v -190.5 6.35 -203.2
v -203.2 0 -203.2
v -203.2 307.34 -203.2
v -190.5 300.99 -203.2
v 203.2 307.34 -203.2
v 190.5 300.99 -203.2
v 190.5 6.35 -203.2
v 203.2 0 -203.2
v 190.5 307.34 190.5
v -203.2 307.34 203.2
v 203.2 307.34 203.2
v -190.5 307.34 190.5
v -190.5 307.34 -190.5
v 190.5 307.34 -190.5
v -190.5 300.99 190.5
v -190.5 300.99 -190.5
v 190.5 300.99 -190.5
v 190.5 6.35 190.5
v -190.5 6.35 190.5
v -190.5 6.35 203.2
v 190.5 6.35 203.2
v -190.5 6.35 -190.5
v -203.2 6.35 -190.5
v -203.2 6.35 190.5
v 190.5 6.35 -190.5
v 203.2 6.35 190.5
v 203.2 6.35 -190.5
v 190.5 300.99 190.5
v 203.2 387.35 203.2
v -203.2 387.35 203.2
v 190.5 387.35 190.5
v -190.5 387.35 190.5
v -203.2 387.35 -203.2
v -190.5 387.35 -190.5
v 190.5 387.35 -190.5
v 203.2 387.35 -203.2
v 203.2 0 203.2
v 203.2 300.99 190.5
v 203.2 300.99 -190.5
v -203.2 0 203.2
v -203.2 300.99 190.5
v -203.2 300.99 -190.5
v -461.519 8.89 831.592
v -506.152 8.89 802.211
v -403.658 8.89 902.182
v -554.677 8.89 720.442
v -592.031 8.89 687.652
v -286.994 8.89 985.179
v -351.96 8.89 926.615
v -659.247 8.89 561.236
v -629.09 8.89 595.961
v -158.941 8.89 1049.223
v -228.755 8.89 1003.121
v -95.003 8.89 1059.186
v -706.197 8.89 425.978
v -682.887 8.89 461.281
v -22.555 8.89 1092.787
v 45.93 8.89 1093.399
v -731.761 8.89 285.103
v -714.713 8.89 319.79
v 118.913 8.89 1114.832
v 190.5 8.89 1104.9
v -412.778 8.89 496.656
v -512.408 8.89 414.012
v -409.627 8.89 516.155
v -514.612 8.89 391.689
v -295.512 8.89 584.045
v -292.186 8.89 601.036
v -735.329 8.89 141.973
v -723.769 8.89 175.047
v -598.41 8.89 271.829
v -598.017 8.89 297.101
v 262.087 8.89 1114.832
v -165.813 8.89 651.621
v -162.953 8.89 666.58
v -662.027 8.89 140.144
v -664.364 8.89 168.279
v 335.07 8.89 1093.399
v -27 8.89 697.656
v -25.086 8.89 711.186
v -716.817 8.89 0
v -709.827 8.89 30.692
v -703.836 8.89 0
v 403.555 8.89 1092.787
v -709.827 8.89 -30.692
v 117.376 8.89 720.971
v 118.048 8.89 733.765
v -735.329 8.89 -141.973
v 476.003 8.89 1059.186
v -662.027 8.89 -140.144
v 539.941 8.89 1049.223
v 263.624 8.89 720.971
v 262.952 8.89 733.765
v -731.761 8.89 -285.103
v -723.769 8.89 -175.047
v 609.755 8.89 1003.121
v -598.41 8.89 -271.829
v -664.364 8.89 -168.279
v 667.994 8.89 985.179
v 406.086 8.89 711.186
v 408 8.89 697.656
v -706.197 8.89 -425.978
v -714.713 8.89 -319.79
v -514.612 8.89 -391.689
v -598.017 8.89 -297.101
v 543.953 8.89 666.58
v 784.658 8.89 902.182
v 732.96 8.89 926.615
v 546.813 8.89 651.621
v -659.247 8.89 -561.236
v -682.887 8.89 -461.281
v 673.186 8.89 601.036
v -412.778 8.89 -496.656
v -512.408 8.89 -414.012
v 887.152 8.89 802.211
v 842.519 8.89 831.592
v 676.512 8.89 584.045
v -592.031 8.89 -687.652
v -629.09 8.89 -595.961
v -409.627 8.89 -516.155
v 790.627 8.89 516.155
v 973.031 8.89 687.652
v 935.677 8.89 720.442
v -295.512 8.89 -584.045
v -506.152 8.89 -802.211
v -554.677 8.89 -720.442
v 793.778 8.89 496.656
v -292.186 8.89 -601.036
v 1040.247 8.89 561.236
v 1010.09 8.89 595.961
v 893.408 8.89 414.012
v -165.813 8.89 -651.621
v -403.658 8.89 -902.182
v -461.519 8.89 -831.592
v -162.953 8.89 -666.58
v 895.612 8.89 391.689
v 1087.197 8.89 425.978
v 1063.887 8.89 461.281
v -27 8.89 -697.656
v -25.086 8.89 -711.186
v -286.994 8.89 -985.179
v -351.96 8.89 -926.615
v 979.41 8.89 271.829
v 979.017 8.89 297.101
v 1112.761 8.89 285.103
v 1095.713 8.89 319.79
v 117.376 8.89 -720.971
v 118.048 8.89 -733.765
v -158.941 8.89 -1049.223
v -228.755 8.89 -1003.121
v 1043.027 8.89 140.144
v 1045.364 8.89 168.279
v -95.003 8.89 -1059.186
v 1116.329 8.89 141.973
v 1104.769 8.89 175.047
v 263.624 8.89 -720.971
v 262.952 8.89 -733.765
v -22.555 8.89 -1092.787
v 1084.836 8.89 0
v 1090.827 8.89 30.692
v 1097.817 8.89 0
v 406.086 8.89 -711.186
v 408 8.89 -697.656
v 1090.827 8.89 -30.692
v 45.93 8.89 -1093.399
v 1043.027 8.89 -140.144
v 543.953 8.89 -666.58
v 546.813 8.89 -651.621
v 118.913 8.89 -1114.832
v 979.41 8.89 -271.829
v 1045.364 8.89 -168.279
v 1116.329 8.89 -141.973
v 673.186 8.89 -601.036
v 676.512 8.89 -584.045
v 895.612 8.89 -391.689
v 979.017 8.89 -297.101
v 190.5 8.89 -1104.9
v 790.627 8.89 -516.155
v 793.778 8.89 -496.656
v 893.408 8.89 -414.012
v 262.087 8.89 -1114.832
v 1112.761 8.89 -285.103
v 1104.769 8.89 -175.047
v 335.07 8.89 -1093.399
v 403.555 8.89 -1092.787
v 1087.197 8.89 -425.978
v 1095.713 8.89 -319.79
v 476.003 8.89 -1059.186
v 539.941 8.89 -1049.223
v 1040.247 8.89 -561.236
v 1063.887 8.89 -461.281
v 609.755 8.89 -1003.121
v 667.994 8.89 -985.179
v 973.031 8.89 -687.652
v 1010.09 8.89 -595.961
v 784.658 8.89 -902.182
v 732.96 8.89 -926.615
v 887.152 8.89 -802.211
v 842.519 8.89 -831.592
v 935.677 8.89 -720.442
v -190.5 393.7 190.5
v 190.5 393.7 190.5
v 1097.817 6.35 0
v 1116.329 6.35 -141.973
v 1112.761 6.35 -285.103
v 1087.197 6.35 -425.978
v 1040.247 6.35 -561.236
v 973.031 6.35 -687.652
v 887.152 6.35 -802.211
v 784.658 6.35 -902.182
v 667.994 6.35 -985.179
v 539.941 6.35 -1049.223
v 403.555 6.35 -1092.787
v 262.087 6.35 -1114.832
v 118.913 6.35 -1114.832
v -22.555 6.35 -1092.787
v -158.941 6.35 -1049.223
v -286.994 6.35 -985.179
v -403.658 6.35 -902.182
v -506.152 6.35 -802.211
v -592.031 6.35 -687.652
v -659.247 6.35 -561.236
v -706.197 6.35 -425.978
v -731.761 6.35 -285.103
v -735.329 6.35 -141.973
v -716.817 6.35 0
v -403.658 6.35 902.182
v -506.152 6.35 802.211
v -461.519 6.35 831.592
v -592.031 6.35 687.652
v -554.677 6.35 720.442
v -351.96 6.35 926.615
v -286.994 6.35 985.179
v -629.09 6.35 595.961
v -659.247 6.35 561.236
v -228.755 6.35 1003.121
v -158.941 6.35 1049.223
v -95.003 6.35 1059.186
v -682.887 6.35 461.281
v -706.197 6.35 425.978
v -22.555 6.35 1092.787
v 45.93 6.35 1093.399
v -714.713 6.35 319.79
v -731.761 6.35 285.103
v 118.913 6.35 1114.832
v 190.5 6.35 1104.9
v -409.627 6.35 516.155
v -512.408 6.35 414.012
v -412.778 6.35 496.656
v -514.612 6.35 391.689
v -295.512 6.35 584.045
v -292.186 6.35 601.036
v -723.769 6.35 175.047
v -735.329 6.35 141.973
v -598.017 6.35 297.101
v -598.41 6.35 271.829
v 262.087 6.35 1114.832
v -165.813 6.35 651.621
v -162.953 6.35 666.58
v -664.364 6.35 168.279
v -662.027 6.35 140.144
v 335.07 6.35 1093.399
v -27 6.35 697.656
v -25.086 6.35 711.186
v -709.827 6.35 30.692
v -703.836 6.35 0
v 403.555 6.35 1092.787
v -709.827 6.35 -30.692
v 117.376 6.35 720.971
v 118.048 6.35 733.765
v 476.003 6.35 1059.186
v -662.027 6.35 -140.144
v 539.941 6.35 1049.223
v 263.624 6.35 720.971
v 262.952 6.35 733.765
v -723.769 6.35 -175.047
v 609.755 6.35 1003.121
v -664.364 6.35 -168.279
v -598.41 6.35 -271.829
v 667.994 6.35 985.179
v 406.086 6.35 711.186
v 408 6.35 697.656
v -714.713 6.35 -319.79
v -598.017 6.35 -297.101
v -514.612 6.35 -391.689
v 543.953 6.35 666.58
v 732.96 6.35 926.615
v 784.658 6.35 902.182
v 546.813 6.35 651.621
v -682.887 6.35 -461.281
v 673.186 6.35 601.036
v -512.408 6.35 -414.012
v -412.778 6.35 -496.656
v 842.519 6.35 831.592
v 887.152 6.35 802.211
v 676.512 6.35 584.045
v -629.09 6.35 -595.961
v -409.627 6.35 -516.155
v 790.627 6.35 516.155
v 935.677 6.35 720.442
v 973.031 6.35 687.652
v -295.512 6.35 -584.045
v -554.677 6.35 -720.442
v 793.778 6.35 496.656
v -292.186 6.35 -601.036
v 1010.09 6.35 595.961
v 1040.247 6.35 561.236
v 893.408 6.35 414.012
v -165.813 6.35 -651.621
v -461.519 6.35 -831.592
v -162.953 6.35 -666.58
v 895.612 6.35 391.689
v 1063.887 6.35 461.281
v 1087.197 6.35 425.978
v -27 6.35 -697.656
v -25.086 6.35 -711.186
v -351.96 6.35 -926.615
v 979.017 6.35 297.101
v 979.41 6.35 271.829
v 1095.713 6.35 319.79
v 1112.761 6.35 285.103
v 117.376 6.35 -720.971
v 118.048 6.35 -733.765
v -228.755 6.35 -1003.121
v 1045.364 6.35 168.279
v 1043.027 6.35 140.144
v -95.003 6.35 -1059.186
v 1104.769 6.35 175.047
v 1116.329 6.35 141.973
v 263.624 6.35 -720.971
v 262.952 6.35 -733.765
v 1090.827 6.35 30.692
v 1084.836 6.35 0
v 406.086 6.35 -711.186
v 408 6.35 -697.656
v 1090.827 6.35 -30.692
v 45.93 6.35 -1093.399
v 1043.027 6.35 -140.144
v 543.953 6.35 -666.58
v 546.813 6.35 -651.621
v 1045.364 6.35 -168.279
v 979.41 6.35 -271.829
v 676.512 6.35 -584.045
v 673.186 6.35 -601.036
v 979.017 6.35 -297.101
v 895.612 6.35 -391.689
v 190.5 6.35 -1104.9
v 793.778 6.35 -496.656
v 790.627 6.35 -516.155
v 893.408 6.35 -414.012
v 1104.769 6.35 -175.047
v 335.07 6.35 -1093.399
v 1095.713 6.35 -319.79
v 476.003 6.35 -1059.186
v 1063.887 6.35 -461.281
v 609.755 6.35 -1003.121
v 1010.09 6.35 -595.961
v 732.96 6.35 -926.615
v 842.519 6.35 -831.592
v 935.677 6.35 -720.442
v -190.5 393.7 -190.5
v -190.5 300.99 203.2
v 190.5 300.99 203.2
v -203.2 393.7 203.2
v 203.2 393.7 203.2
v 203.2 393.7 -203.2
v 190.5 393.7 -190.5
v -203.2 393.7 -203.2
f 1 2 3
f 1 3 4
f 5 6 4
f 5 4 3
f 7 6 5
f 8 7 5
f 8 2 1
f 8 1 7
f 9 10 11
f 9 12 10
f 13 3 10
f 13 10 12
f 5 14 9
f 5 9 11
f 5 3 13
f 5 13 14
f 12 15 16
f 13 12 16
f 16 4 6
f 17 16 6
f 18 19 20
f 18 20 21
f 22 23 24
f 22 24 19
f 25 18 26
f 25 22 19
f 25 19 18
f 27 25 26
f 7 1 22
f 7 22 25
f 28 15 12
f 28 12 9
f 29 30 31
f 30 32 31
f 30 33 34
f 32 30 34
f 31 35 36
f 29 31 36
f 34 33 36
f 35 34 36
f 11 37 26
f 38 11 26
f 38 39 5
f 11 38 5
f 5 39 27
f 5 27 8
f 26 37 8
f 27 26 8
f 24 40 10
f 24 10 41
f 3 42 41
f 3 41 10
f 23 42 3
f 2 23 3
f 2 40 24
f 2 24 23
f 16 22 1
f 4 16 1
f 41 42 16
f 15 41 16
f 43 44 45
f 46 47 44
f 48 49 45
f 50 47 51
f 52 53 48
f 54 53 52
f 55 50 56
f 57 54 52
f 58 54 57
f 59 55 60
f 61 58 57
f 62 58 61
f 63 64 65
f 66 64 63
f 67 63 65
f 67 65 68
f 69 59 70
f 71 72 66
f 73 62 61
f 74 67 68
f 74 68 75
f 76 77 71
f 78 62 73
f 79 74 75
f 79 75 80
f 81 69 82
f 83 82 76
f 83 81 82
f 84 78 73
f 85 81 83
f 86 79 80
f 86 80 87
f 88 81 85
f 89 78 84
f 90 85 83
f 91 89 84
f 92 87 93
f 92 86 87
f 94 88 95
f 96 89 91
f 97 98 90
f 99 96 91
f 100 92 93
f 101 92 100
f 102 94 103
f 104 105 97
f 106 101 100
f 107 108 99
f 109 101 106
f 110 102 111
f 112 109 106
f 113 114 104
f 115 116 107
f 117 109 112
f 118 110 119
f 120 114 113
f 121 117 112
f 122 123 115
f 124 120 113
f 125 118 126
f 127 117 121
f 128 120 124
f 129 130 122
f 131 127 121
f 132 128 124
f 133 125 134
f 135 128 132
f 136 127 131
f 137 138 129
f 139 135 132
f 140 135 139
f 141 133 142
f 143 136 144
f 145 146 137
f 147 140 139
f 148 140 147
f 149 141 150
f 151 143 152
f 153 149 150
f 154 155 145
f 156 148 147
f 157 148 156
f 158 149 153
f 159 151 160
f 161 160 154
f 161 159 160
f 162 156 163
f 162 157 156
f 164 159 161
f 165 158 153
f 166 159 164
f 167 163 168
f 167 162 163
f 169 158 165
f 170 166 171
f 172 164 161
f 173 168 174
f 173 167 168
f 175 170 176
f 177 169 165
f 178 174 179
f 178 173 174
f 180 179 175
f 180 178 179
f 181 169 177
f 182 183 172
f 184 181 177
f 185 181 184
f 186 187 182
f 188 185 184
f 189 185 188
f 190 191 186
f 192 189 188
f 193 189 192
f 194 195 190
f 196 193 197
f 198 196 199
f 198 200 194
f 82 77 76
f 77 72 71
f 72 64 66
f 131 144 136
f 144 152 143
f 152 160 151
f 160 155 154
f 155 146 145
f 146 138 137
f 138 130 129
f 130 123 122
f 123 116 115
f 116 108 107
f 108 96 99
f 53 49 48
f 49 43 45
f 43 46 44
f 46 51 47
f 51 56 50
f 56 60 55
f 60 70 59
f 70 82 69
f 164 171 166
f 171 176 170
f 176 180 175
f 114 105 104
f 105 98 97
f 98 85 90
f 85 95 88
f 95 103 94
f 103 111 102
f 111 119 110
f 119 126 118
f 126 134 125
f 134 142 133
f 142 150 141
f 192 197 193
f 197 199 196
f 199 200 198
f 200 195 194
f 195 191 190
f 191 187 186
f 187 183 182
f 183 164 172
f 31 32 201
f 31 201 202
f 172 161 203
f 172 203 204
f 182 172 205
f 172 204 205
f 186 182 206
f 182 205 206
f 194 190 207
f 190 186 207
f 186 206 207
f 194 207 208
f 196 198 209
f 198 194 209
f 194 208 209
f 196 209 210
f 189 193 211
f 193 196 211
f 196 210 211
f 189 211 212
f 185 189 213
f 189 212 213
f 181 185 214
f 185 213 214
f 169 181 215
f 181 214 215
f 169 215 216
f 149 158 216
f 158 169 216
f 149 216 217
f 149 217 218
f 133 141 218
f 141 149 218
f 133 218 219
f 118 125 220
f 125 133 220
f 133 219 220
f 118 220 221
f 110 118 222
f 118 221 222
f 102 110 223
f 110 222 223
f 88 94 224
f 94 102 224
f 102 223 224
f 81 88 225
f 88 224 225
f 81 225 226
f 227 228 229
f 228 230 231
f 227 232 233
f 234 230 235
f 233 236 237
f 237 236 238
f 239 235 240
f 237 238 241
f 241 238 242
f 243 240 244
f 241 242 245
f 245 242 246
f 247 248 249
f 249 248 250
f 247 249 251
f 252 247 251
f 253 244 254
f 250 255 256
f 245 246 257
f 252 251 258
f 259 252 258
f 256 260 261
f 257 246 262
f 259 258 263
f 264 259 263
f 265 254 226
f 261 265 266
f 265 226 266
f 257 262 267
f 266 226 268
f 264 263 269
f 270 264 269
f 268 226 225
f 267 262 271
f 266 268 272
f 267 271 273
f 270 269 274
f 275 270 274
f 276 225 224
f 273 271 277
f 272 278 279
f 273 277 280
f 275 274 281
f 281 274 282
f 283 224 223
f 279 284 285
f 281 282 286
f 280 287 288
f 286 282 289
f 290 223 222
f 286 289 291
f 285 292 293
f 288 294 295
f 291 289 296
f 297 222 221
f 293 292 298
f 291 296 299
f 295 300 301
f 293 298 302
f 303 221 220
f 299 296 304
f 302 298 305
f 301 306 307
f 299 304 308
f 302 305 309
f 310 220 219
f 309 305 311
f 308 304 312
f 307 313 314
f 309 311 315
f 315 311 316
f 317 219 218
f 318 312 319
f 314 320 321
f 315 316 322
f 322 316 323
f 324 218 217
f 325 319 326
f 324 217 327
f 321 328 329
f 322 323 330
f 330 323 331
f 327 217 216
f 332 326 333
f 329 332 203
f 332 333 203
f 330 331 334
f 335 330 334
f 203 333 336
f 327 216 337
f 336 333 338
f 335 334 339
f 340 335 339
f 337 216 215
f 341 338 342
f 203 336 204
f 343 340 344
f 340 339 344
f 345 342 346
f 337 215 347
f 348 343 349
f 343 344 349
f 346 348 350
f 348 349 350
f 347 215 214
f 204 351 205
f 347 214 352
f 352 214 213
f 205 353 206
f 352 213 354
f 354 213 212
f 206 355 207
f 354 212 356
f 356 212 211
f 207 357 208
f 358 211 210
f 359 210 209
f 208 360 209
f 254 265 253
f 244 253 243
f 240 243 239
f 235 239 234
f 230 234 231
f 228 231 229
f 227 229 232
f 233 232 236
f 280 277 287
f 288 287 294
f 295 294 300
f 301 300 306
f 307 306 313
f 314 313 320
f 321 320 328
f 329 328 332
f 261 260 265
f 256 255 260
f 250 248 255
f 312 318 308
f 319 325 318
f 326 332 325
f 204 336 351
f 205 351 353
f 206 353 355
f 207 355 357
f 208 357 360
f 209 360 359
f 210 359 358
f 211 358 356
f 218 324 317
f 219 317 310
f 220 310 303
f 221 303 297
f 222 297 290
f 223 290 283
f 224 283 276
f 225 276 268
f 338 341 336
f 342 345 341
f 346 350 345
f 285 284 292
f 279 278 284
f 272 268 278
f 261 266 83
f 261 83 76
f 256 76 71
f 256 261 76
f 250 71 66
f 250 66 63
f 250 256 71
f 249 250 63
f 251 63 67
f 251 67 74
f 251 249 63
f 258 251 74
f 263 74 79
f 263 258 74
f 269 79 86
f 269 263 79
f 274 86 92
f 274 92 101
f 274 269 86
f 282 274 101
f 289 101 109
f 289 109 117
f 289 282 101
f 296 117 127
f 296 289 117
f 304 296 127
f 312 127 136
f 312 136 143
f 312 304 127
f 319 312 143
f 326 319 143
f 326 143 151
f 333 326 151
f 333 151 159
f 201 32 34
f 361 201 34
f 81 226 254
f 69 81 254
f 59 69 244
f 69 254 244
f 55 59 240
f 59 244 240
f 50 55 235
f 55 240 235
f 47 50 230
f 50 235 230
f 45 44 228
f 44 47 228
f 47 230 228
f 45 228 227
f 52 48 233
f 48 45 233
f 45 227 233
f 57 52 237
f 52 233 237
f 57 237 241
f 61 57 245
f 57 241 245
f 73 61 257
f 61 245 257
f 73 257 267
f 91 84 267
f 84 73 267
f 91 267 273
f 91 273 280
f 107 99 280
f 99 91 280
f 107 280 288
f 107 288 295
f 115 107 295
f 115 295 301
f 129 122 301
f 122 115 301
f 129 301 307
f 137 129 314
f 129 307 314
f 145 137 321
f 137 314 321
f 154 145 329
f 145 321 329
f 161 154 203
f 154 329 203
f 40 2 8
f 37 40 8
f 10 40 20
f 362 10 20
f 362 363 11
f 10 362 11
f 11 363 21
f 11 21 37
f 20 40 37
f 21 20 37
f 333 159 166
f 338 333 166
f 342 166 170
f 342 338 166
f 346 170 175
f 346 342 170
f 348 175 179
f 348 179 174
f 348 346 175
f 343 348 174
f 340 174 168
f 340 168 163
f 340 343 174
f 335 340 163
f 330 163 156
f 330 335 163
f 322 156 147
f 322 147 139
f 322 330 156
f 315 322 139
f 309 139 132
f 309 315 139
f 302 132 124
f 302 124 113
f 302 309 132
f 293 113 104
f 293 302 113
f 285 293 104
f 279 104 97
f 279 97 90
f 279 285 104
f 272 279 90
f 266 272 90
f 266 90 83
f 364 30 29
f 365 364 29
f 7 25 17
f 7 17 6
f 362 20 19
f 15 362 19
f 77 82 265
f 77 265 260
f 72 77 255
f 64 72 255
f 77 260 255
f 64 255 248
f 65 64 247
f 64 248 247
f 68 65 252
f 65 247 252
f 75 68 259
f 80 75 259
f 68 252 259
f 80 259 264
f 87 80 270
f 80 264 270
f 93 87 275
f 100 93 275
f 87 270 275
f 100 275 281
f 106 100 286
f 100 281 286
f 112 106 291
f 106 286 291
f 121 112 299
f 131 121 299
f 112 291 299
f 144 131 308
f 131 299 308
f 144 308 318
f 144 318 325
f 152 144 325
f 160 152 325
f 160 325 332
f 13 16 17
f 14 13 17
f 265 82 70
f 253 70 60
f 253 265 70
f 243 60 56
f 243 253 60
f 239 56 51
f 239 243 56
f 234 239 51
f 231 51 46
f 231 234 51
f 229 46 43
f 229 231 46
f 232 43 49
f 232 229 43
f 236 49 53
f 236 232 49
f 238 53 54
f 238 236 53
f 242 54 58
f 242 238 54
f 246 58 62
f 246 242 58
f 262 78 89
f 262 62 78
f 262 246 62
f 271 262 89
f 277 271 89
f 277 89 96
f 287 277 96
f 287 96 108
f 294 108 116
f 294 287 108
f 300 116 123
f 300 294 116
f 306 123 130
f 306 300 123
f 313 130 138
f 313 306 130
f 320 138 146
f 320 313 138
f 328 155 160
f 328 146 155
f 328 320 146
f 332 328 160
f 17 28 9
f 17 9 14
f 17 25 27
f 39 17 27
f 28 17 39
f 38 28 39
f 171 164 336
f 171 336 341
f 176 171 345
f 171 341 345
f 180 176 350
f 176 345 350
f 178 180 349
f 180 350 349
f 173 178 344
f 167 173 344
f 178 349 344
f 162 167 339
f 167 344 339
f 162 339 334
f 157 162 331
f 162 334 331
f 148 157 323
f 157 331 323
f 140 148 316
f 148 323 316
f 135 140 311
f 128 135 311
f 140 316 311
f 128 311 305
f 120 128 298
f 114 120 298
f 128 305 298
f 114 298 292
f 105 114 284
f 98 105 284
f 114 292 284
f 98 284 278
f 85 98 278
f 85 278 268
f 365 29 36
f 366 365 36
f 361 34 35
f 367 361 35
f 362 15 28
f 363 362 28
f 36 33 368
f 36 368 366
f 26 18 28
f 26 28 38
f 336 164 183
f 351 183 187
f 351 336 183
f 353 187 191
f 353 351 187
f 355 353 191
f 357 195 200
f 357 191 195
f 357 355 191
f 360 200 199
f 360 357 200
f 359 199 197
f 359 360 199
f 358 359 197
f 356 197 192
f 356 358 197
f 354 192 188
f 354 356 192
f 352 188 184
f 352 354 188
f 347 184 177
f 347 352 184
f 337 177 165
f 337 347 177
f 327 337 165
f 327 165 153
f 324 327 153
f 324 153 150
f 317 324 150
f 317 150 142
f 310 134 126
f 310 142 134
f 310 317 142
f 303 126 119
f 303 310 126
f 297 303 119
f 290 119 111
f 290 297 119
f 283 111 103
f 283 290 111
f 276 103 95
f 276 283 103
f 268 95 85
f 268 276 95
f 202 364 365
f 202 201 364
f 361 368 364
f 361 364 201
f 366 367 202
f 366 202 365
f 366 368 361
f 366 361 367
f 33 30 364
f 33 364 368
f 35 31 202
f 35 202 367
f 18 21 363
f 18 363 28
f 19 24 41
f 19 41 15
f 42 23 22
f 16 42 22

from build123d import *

# Parameters (mm, degrees)
SKETCH1_W           = 406.4
SKETCH1_H           = 406.4
BOSS_EXTRUDE1_DEPTH = 6.35
SKETCH2_W           = 12.7
SKETCH2_H           = 12.7
BOSS_EXTRUDE2_DEPTH = 294.64
SKETCH3_W           = 406.4
SKETCH3_H           = 406.4
SKETCH3_W_2         = 381
SKETCH3_H_2         = 381
BOSS_EXTRUDE3_DEPTH = 6.35
SKETCH5_W           = 406.4
SKETCH5_H           = 406.4
SKETCH5_W_2         = 381
SKETCH5_H_2         = 381
BOSS_EXTRUDE4_DEPTH = 6.35
SKETCH8_R           = 927.1
SKETCH8_R_2         = 914.4
BOSS_EXTRUDE8_DEPTH = 2.54


with BuildPart() as part:
    # Sketch1 → Boss-Extrude1 (new body)
    with BuildSketch(Plane(origin=(0, 0, 0), x_dir=(1, 0, 0), z_dir=(0, 1, 0))):
        Rectangle(SKETCH1_W, SKETCH1_H)
    extrude(amount=BOSS_EXTRUDE1_DEPTH)

    # Sketch2 → Boss-Extrude2 (add)
    with BuildSketch(Plane(origin=(0, 6.35, 0), x_dir=(1, 0, 0), z_dir=(0, 1, 0))):
        with Locations((-196.85, -196.85)):
            Rectangle(SKETCH2_W, SKETCH2_H)
        with Locations((196.85, -196.85)):
            Rectangle(SKETCH2_W, SKETCH2_H)
        with Locations((-196.85, 196.85)):
            Rectangle(SKETCH2_W, SKETCH2_H)
        with Locations((196.85, 196.85)):
            Rectangle(SKETCH2_W, SKETCH2_H)
    extrude(amount=BOSS_EXTRUDE2_DEPTH)

    # Sketch3 → Boss-Extrude3 (add)
    with BuildSketch(Plane(origin=(0, 300.99, 0), x_dir=(1, 0, 0), z_dir=(0, 1, 0))):
        Rectangle(SKETCH3_W, SKETCH3_H)
        Rectangle(SKETCH3_W_2, SKETCH3_H_2, mode=Mode.SUBTRACT)
    extrude(amount=BOSS_EXTRUDE3_DEPTH)


with BuildPart() as body_2:
    # Sketch5 → Boss-Extrude4 (new body)
    with BuildSketch(Plane(origin=(0, 387.35, 0), x_dir=(1, 0, 0), z_dir=(0, 1, 0))):
        Rectangle(SKETCH5_W, SKETCH5_H)
        Rectangle(SKETCH5_W_2, SKETCH5_H_2, mode=Mode.SUBTRACT)
    extrude(amount=BOSS_EXTRUDE4_DEPTH)


with BuildPart() as body_3:
    # Sketch8 → Boss-Extrude8 (new body)
    # profile 1 of 2: a face of its own
    with BuildSketch(Plane(origin=(0, 6.35, 0), x_dir=(1, 0, 0), z_dir=(0, 1, 0))):
        with Locations((190.5, 190.5)):
            Circle(SKETCH8_R)
        with Locations((190.5, 190.5)):
            Circle(SKETCH8_R_2, mode=Mode.SUBTRACT)
    # profile 2 of 2: a face of its own
    with BuildSketch(Plane(origin=(0, 6.35, 0), x_dir=(1, 0, 0), z_dir=(0, 1, 0))):
        with Locations((190.5, -190.5)):
            Circle(SKETCH8_R)
        with Locations((190.5, -190.5)):
            Circle(SKETCH8_R_2, mode=Mode.SUBTRACT)
    extrude(amount=BOSS_EXTRUDE8_DEPTH)


solid = Compound([part.part, body_2.part, body_3.part])
